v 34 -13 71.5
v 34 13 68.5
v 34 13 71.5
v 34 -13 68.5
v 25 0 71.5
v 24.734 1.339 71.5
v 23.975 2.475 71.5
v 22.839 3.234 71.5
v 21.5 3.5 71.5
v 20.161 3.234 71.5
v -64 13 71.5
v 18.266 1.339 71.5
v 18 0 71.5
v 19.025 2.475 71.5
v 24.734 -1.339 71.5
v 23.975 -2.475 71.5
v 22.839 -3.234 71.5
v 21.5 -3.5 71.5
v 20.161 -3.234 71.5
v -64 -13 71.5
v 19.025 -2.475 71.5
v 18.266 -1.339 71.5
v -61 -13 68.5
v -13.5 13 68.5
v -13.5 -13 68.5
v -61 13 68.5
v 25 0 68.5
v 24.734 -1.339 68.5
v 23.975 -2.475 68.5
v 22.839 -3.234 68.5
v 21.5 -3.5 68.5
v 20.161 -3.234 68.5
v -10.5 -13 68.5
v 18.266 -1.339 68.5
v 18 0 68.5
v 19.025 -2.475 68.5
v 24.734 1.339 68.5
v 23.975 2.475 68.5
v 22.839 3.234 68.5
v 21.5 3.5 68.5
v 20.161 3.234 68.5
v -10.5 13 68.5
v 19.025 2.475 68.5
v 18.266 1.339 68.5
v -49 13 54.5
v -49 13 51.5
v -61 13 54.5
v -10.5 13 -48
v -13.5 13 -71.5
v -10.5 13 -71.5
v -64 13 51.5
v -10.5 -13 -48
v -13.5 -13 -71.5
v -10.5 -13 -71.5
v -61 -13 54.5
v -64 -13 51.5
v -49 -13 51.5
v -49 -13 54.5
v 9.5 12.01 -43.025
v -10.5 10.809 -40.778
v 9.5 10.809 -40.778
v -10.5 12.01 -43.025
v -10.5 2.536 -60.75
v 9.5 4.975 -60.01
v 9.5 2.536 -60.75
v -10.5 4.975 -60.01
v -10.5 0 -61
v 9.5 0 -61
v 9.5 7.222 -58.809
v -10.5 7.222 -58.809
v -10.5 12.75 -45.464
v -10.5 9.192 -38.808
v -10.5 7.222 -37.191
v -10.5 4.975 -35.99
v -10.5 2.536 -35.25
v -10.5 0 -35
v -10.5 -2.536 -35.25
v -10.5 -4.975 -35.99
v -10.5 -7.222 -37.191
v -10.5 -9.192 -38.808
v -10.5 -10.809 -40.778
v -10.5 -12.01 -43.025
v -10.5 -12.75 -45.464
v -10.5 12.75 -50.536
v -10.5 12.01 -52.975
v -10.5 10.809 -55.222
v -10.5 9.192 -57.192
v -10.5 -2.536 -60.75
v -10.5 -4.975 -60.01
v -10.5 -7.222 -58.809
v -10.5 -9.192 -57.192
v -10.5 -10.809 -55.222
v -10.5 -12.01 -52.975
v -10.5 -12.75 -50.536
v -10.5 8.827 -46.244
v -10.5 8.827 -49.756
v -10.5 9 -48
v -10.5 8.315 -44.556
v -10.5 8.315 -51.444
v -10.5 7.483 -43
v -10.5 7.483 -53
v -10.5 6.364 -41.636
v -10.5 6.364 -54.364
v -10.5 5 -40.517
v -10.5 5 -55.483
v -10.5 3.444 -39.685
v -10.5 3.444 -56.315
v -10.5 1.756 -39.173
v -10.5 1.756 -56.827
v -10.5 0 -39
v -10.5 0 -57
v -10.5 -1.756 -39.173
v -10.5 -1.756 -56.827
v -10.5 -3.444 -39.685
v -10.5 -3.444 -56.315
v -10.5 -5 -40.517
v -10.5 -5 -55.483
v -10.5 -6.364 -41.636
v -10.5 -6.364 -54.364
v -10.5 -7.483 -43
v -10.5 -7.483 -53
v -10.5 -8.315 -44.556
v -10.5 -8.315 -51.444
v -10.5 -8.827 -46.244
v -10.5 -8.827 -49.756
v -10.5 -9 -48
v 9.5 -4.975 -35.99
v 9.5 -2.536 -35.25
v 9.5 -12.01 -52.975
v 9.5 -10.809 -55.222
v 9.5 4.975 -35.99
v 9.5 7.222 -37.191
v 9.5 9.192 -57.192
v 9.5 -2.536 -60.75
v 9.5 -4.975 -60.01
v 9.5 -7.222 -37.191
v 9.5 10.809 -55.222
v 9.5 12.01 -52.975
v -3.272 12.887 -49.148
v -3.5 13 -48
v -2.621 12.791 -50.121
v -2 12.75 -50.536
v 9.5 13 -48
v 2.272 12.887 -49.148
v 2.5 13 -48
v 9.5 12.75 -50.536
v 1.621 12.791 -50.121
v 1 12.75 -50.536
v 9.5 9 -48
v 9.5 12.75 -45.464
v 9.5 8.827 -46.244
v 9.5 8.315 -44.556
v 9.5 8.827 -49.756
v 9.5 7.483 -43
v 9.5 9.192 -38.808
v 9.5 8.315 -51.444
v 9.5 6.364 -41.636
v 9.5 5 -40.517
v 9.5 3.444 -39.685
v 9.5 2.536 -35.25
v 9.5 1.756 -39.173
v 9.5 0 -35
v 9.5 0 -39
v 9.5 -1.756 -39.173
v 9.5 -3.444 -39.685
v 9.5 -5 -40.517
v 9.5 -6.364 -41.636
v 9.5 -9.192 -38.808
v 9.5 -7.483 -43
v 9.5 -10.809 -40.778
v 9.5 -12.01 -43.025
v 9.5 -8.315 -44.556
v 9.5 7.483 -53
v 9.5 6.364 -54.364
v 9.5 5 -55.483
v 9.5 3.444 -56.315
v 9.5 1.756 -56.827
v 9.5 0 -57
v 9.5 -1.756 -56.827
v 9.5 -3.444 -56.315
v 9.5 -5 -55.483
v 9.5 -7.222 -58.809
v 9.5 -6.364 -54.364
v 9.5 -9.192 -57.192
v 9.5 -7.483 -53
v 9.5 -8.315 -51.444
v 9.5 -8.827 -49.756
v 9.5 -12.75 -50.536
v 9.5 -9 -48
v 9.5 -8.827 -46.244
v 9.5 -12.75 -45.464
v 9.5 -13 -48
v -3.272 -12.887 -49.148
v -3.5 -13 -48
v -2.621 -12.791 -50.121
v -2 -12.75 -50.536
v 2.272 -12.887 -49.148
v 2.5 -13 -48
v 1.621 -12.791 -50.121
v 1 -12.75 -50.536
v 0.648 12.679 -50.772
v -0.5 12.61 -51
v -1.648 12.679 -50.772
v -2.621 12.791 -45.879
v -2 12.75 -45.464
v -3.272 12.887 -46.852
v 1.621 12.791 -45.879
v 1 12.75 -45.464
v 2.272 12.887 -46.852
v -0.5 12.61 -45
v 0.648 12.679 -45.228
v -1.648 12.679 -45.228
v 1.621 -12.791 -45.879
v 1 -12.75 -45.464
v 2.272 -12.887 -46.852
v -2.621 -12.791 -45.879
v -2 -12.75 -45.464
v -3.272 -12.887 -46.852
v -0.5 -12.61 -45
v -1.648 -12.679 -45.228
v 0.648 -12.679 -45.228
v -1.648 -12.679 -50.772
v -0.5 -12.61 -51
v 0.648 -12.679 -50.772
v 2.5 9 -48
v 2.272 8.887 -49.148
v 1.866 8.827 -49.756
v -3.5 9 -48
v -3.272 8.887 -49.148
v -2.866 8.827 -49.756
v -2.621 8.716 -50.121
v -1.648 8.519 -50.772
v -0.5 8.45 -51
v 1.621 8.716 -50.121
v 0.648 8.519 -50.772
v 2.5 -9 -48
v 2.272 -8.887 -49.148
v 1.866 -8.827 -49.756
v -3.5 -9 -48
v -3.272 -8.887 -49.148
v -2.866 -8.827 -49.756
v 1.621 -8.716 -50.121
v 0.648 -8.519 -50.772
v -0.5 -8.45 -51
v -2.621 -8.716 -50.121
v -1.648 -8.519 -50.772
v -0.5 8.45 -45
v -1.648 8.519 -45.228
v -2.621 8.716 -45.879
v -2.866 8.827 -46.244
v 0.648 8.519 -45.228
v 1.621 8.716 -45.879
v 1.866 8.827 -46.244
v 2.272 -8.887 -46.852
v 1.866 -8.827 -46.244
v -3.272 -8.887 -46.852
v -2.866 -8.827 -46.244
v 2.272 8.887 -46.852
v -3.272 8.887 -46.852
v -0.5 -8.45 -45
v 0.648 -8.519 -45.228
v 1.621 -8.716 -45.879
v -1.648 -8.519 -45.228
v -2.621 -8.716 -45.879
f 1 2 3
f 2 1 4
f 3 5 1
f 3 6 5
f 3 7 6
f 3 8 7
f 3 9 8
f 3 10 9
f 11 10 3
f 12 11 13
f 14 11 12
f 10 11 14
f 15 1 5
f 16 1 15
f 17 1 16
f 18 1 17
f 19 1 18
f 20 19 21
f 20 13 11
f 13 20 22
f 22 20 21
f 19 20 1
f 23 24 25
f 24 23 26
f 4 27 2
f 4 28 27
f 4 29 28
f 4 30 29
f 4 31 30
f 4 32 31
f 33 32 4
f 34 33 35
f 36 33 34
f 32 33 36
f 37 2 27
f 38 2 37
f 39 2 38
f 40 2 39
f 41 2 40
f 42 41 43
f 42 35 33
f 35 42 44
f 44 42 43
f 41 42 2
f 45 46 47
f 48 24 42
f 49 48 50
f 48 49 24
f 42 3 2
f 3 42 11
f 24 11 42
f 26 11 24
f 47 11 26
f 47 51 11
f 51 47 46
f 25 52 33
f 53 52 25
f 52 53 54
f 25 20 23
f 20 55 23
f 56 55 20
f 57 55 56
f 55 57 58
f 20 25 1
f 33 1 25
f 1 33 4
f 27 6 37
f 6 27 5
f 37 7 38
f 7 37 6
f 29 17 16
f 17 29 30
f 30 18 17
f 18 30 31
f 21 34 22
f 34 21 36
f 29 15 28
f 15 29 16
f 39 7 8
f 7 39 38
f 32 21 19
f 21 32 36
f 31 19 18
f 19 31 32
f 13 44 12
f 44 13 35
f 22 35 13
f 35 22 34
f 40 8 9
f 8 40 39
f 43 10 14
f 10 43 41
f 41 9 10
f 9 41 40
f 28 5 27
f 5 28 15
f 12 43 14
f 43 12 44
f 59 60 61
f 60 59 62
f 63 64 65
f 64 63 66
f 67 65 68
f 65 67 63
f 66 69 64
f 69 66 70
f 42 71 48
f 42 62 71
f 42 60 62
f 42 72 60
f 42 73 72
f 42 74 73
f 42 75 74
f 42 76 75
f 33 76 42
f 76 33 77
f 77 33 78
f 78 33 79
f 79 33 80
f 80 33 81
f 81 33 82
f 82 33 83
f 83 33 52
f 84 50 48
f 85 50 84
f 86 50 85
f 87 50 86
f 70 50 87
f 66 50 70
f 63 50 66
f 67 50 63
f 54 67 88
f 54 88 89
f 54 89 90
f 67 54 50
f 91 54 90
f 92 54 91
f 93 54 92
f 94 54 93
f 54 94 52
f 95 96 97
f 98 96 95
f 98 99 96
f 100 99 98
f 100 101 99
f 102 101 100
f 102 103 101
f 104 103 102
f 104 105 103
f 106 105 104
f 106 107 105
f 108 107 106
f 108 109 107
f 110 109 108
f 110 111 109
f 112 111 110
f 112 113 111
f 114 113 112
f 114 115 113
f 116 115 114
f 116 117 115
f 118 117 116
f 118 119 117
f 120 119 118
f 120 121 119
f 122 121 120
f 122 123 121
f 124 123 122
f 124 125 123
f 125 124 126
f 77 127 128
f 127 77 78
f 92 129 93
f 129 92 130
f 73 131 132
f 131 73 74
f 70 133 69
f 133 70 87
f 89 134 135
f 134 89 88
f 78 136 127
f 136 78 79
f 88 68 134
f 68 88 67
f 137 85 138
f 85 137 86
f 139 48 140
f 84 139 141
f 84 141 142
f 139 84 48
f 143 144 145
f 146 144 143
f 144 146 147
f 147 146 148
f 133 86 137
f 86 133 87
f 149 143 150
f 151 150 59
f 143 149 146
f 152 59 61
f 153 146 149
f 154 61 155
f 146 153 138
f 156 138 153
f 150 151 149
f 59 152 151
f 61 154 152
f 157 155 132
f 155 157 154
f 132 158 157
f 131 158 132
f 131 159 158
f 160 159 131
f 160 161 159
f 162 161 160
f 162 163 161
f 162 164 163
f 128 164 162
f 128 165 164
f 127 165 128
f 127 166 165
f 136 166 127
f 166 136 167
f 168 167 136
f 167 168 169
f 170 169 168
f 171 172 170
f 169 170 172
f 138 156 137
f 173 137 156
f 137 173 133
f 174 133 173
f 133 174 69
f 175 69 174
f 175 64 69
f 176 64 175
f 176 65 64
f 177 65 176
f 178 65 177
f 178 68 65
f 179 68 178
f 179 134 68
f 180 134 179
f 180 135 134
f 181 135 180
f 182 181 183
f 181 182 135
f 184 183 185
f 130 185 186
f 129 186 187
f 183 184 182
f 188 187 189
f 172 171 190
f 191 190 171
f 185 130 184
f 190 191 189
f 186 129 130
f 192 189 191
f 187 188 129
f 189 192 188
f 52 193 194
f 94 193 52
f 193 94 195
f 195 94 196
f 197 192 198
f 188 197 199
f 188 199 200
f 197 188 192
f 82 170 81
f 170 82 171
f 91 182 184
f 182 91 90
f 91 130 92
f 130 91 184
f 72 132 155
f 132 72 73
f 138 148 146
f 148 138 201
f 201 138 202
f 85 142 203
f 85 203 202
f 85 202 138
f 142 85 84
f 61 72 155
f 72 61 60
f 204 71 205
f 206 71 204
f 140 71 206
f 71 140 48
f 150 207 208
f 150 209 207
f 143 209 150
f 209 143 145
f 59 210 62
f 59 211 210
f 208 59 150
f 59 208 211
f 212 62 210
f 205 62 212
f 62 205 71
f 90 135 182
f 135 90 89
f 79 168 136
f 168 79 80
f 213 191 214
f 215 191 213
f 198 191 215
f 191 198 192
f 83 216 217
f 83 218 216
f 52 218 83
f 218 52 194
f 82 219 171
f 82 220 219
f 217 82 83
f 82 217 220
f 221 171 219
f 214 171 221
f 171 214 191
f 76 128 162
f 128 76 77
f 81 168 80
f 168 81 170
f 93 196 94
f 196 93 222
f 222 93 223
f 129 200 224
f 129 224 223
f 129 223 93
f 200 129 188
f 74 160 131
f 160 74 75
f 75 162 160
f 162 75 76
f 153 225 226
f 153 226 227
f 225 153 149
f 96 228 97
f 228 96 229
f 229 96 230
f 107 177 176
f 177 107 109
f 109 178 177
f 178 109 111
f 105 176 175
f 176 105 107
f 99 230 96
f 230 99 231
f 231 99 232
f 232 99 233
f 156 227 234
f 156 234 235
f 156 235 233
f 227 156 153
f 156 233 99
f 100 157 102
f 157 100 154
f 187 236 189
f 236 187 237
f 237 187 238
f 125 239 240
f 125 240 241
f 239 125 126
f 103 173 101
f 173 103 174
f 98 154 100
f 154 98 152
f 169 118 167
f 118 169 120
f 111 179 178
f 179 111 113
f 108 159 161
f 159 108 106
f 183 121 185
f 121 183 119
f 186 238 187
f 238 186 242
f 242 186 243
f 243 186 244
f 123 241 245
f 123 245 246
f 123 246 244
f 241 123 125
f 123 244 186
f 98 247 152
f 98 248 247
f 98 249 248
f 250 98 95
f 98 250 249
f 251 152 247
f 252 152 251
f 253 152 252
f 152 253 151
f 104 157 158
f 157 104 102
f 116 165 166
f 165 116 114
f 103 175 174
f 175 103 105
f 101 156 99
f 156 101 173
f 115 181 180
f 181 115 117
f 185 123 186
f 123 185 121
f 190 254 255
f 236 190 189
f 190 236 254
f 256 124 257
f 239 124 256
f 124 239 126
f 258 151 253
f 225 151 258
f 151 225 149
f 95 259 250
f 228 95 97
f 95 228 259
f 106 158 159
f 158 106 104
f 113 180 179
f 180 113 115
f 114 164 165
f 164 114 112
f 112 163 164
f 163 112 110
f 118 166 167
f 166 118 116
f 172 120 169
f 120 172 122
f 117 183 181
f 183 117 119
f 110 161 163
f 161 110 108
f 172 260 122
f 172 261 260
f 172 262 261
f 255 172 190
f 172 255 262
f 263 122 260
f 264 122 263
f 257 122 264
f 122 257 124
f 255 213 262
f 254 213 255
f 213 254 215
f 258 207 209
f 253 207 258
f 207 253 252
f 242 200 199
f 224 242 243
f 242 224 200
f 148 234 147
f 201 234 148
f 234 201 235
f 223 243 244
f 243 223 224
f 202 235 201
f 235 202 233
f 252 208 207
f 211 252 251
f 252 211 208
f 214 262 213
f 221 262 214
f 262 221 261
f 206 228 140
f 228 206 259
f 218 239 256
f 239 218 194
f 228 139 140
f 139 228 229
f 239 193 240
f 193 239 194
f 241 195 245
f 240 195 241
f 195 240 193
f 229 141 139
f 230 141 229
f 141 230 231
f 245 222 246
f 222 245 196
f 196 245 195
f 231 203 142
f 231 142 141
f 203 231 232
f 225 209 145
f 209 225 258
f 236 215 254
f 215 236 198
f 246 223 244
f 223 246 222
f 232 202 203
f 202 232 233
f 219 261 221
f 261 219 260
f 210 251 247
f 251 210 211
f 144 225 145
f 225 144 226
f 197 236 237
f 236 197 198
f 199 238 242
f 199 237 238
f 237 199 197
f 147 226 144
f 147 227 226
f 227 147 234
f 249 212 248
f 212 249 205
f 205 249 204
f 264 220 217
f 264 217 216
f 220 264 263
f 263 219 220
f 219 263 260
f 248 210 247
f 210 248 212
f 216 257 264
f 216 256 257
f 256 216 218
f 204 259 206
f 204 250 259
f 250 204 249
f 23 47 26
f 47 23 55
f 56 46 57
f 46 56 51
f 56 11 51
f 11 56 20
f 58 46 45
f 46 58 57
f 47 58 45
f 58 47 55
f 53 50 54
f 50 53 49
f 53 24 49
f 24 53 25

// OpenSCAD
wd = 26;

module mount() {
    translate([0,0,8])
        cube([45,wd,3], center=true);

    translate([-45/2-1.5,0,-0.5])
        cube([3,wd,20], center=true);

    translate([-18,0,-9])
        cube([15,wd,3], center=true);

    translate([45/2+4,0,-63-0.5])
        cube([3,wd,140], center=true);

    difference() {
    translate([45/2+50/2,0,8])
        cube([50,wd,3], center=true);

    translate([60,0,8])
        cylinder(d=7, h=10, center=true, $fn=16);
    }

    translate([38,0,-110])
        rotate([0,90,0])
            difference() {
                cylinder(d=wd, h=20, center=true, $fn=32);
                cylinder(d=wd-8, h=21, center=true, $fn=32);
                rotate([90,0,0])
                    cylinder(d=6, h=wd+2, center=true, $fn=16);
            }
}

module right_printer_wall() {
    translate([0,0,0])
        cube([42.6,500,13], center=true);
    translate([21.3-2.5,0,-250])
        cube([5,500,500], center=true);
}

module fillament() {
translate([60,0,-100])
    rotate([0,90,0]) {
        difference() {
            cylinder(h=60, d=200, center=true, $fn=32);
            cylinder(h=60.1, d=56, center=true, $fn=32);
        }
    }
}

module frontcut() {
    intersection() {
        translate([0,-500,0])
            cube([1000,1000,1000], center=true);
        children();
    }
}

module backcut() {
    intersection() {
        translate([0,500,0])
            cube([1000,1000,1000], center=true);
        children();
    }
}

/*    
color("blue")
    translate([0,-110,0])
        fillament();

color("blue")
    translate([0,110,0])
        fillament();


color("gray")
    right_printer_wall();
*/

//translate([0,110,0])
//    mount();

//translate([0,-110,0])
//    mount();



//color("white", alpha=0.5)
//    cube([128,60,143], center=true)
/*
frontcut() {
    translate([-38.5,0,62])
        mount();
}
*/

//backcut() {
    translate([-38.5,0,62])
        mount();
//}
